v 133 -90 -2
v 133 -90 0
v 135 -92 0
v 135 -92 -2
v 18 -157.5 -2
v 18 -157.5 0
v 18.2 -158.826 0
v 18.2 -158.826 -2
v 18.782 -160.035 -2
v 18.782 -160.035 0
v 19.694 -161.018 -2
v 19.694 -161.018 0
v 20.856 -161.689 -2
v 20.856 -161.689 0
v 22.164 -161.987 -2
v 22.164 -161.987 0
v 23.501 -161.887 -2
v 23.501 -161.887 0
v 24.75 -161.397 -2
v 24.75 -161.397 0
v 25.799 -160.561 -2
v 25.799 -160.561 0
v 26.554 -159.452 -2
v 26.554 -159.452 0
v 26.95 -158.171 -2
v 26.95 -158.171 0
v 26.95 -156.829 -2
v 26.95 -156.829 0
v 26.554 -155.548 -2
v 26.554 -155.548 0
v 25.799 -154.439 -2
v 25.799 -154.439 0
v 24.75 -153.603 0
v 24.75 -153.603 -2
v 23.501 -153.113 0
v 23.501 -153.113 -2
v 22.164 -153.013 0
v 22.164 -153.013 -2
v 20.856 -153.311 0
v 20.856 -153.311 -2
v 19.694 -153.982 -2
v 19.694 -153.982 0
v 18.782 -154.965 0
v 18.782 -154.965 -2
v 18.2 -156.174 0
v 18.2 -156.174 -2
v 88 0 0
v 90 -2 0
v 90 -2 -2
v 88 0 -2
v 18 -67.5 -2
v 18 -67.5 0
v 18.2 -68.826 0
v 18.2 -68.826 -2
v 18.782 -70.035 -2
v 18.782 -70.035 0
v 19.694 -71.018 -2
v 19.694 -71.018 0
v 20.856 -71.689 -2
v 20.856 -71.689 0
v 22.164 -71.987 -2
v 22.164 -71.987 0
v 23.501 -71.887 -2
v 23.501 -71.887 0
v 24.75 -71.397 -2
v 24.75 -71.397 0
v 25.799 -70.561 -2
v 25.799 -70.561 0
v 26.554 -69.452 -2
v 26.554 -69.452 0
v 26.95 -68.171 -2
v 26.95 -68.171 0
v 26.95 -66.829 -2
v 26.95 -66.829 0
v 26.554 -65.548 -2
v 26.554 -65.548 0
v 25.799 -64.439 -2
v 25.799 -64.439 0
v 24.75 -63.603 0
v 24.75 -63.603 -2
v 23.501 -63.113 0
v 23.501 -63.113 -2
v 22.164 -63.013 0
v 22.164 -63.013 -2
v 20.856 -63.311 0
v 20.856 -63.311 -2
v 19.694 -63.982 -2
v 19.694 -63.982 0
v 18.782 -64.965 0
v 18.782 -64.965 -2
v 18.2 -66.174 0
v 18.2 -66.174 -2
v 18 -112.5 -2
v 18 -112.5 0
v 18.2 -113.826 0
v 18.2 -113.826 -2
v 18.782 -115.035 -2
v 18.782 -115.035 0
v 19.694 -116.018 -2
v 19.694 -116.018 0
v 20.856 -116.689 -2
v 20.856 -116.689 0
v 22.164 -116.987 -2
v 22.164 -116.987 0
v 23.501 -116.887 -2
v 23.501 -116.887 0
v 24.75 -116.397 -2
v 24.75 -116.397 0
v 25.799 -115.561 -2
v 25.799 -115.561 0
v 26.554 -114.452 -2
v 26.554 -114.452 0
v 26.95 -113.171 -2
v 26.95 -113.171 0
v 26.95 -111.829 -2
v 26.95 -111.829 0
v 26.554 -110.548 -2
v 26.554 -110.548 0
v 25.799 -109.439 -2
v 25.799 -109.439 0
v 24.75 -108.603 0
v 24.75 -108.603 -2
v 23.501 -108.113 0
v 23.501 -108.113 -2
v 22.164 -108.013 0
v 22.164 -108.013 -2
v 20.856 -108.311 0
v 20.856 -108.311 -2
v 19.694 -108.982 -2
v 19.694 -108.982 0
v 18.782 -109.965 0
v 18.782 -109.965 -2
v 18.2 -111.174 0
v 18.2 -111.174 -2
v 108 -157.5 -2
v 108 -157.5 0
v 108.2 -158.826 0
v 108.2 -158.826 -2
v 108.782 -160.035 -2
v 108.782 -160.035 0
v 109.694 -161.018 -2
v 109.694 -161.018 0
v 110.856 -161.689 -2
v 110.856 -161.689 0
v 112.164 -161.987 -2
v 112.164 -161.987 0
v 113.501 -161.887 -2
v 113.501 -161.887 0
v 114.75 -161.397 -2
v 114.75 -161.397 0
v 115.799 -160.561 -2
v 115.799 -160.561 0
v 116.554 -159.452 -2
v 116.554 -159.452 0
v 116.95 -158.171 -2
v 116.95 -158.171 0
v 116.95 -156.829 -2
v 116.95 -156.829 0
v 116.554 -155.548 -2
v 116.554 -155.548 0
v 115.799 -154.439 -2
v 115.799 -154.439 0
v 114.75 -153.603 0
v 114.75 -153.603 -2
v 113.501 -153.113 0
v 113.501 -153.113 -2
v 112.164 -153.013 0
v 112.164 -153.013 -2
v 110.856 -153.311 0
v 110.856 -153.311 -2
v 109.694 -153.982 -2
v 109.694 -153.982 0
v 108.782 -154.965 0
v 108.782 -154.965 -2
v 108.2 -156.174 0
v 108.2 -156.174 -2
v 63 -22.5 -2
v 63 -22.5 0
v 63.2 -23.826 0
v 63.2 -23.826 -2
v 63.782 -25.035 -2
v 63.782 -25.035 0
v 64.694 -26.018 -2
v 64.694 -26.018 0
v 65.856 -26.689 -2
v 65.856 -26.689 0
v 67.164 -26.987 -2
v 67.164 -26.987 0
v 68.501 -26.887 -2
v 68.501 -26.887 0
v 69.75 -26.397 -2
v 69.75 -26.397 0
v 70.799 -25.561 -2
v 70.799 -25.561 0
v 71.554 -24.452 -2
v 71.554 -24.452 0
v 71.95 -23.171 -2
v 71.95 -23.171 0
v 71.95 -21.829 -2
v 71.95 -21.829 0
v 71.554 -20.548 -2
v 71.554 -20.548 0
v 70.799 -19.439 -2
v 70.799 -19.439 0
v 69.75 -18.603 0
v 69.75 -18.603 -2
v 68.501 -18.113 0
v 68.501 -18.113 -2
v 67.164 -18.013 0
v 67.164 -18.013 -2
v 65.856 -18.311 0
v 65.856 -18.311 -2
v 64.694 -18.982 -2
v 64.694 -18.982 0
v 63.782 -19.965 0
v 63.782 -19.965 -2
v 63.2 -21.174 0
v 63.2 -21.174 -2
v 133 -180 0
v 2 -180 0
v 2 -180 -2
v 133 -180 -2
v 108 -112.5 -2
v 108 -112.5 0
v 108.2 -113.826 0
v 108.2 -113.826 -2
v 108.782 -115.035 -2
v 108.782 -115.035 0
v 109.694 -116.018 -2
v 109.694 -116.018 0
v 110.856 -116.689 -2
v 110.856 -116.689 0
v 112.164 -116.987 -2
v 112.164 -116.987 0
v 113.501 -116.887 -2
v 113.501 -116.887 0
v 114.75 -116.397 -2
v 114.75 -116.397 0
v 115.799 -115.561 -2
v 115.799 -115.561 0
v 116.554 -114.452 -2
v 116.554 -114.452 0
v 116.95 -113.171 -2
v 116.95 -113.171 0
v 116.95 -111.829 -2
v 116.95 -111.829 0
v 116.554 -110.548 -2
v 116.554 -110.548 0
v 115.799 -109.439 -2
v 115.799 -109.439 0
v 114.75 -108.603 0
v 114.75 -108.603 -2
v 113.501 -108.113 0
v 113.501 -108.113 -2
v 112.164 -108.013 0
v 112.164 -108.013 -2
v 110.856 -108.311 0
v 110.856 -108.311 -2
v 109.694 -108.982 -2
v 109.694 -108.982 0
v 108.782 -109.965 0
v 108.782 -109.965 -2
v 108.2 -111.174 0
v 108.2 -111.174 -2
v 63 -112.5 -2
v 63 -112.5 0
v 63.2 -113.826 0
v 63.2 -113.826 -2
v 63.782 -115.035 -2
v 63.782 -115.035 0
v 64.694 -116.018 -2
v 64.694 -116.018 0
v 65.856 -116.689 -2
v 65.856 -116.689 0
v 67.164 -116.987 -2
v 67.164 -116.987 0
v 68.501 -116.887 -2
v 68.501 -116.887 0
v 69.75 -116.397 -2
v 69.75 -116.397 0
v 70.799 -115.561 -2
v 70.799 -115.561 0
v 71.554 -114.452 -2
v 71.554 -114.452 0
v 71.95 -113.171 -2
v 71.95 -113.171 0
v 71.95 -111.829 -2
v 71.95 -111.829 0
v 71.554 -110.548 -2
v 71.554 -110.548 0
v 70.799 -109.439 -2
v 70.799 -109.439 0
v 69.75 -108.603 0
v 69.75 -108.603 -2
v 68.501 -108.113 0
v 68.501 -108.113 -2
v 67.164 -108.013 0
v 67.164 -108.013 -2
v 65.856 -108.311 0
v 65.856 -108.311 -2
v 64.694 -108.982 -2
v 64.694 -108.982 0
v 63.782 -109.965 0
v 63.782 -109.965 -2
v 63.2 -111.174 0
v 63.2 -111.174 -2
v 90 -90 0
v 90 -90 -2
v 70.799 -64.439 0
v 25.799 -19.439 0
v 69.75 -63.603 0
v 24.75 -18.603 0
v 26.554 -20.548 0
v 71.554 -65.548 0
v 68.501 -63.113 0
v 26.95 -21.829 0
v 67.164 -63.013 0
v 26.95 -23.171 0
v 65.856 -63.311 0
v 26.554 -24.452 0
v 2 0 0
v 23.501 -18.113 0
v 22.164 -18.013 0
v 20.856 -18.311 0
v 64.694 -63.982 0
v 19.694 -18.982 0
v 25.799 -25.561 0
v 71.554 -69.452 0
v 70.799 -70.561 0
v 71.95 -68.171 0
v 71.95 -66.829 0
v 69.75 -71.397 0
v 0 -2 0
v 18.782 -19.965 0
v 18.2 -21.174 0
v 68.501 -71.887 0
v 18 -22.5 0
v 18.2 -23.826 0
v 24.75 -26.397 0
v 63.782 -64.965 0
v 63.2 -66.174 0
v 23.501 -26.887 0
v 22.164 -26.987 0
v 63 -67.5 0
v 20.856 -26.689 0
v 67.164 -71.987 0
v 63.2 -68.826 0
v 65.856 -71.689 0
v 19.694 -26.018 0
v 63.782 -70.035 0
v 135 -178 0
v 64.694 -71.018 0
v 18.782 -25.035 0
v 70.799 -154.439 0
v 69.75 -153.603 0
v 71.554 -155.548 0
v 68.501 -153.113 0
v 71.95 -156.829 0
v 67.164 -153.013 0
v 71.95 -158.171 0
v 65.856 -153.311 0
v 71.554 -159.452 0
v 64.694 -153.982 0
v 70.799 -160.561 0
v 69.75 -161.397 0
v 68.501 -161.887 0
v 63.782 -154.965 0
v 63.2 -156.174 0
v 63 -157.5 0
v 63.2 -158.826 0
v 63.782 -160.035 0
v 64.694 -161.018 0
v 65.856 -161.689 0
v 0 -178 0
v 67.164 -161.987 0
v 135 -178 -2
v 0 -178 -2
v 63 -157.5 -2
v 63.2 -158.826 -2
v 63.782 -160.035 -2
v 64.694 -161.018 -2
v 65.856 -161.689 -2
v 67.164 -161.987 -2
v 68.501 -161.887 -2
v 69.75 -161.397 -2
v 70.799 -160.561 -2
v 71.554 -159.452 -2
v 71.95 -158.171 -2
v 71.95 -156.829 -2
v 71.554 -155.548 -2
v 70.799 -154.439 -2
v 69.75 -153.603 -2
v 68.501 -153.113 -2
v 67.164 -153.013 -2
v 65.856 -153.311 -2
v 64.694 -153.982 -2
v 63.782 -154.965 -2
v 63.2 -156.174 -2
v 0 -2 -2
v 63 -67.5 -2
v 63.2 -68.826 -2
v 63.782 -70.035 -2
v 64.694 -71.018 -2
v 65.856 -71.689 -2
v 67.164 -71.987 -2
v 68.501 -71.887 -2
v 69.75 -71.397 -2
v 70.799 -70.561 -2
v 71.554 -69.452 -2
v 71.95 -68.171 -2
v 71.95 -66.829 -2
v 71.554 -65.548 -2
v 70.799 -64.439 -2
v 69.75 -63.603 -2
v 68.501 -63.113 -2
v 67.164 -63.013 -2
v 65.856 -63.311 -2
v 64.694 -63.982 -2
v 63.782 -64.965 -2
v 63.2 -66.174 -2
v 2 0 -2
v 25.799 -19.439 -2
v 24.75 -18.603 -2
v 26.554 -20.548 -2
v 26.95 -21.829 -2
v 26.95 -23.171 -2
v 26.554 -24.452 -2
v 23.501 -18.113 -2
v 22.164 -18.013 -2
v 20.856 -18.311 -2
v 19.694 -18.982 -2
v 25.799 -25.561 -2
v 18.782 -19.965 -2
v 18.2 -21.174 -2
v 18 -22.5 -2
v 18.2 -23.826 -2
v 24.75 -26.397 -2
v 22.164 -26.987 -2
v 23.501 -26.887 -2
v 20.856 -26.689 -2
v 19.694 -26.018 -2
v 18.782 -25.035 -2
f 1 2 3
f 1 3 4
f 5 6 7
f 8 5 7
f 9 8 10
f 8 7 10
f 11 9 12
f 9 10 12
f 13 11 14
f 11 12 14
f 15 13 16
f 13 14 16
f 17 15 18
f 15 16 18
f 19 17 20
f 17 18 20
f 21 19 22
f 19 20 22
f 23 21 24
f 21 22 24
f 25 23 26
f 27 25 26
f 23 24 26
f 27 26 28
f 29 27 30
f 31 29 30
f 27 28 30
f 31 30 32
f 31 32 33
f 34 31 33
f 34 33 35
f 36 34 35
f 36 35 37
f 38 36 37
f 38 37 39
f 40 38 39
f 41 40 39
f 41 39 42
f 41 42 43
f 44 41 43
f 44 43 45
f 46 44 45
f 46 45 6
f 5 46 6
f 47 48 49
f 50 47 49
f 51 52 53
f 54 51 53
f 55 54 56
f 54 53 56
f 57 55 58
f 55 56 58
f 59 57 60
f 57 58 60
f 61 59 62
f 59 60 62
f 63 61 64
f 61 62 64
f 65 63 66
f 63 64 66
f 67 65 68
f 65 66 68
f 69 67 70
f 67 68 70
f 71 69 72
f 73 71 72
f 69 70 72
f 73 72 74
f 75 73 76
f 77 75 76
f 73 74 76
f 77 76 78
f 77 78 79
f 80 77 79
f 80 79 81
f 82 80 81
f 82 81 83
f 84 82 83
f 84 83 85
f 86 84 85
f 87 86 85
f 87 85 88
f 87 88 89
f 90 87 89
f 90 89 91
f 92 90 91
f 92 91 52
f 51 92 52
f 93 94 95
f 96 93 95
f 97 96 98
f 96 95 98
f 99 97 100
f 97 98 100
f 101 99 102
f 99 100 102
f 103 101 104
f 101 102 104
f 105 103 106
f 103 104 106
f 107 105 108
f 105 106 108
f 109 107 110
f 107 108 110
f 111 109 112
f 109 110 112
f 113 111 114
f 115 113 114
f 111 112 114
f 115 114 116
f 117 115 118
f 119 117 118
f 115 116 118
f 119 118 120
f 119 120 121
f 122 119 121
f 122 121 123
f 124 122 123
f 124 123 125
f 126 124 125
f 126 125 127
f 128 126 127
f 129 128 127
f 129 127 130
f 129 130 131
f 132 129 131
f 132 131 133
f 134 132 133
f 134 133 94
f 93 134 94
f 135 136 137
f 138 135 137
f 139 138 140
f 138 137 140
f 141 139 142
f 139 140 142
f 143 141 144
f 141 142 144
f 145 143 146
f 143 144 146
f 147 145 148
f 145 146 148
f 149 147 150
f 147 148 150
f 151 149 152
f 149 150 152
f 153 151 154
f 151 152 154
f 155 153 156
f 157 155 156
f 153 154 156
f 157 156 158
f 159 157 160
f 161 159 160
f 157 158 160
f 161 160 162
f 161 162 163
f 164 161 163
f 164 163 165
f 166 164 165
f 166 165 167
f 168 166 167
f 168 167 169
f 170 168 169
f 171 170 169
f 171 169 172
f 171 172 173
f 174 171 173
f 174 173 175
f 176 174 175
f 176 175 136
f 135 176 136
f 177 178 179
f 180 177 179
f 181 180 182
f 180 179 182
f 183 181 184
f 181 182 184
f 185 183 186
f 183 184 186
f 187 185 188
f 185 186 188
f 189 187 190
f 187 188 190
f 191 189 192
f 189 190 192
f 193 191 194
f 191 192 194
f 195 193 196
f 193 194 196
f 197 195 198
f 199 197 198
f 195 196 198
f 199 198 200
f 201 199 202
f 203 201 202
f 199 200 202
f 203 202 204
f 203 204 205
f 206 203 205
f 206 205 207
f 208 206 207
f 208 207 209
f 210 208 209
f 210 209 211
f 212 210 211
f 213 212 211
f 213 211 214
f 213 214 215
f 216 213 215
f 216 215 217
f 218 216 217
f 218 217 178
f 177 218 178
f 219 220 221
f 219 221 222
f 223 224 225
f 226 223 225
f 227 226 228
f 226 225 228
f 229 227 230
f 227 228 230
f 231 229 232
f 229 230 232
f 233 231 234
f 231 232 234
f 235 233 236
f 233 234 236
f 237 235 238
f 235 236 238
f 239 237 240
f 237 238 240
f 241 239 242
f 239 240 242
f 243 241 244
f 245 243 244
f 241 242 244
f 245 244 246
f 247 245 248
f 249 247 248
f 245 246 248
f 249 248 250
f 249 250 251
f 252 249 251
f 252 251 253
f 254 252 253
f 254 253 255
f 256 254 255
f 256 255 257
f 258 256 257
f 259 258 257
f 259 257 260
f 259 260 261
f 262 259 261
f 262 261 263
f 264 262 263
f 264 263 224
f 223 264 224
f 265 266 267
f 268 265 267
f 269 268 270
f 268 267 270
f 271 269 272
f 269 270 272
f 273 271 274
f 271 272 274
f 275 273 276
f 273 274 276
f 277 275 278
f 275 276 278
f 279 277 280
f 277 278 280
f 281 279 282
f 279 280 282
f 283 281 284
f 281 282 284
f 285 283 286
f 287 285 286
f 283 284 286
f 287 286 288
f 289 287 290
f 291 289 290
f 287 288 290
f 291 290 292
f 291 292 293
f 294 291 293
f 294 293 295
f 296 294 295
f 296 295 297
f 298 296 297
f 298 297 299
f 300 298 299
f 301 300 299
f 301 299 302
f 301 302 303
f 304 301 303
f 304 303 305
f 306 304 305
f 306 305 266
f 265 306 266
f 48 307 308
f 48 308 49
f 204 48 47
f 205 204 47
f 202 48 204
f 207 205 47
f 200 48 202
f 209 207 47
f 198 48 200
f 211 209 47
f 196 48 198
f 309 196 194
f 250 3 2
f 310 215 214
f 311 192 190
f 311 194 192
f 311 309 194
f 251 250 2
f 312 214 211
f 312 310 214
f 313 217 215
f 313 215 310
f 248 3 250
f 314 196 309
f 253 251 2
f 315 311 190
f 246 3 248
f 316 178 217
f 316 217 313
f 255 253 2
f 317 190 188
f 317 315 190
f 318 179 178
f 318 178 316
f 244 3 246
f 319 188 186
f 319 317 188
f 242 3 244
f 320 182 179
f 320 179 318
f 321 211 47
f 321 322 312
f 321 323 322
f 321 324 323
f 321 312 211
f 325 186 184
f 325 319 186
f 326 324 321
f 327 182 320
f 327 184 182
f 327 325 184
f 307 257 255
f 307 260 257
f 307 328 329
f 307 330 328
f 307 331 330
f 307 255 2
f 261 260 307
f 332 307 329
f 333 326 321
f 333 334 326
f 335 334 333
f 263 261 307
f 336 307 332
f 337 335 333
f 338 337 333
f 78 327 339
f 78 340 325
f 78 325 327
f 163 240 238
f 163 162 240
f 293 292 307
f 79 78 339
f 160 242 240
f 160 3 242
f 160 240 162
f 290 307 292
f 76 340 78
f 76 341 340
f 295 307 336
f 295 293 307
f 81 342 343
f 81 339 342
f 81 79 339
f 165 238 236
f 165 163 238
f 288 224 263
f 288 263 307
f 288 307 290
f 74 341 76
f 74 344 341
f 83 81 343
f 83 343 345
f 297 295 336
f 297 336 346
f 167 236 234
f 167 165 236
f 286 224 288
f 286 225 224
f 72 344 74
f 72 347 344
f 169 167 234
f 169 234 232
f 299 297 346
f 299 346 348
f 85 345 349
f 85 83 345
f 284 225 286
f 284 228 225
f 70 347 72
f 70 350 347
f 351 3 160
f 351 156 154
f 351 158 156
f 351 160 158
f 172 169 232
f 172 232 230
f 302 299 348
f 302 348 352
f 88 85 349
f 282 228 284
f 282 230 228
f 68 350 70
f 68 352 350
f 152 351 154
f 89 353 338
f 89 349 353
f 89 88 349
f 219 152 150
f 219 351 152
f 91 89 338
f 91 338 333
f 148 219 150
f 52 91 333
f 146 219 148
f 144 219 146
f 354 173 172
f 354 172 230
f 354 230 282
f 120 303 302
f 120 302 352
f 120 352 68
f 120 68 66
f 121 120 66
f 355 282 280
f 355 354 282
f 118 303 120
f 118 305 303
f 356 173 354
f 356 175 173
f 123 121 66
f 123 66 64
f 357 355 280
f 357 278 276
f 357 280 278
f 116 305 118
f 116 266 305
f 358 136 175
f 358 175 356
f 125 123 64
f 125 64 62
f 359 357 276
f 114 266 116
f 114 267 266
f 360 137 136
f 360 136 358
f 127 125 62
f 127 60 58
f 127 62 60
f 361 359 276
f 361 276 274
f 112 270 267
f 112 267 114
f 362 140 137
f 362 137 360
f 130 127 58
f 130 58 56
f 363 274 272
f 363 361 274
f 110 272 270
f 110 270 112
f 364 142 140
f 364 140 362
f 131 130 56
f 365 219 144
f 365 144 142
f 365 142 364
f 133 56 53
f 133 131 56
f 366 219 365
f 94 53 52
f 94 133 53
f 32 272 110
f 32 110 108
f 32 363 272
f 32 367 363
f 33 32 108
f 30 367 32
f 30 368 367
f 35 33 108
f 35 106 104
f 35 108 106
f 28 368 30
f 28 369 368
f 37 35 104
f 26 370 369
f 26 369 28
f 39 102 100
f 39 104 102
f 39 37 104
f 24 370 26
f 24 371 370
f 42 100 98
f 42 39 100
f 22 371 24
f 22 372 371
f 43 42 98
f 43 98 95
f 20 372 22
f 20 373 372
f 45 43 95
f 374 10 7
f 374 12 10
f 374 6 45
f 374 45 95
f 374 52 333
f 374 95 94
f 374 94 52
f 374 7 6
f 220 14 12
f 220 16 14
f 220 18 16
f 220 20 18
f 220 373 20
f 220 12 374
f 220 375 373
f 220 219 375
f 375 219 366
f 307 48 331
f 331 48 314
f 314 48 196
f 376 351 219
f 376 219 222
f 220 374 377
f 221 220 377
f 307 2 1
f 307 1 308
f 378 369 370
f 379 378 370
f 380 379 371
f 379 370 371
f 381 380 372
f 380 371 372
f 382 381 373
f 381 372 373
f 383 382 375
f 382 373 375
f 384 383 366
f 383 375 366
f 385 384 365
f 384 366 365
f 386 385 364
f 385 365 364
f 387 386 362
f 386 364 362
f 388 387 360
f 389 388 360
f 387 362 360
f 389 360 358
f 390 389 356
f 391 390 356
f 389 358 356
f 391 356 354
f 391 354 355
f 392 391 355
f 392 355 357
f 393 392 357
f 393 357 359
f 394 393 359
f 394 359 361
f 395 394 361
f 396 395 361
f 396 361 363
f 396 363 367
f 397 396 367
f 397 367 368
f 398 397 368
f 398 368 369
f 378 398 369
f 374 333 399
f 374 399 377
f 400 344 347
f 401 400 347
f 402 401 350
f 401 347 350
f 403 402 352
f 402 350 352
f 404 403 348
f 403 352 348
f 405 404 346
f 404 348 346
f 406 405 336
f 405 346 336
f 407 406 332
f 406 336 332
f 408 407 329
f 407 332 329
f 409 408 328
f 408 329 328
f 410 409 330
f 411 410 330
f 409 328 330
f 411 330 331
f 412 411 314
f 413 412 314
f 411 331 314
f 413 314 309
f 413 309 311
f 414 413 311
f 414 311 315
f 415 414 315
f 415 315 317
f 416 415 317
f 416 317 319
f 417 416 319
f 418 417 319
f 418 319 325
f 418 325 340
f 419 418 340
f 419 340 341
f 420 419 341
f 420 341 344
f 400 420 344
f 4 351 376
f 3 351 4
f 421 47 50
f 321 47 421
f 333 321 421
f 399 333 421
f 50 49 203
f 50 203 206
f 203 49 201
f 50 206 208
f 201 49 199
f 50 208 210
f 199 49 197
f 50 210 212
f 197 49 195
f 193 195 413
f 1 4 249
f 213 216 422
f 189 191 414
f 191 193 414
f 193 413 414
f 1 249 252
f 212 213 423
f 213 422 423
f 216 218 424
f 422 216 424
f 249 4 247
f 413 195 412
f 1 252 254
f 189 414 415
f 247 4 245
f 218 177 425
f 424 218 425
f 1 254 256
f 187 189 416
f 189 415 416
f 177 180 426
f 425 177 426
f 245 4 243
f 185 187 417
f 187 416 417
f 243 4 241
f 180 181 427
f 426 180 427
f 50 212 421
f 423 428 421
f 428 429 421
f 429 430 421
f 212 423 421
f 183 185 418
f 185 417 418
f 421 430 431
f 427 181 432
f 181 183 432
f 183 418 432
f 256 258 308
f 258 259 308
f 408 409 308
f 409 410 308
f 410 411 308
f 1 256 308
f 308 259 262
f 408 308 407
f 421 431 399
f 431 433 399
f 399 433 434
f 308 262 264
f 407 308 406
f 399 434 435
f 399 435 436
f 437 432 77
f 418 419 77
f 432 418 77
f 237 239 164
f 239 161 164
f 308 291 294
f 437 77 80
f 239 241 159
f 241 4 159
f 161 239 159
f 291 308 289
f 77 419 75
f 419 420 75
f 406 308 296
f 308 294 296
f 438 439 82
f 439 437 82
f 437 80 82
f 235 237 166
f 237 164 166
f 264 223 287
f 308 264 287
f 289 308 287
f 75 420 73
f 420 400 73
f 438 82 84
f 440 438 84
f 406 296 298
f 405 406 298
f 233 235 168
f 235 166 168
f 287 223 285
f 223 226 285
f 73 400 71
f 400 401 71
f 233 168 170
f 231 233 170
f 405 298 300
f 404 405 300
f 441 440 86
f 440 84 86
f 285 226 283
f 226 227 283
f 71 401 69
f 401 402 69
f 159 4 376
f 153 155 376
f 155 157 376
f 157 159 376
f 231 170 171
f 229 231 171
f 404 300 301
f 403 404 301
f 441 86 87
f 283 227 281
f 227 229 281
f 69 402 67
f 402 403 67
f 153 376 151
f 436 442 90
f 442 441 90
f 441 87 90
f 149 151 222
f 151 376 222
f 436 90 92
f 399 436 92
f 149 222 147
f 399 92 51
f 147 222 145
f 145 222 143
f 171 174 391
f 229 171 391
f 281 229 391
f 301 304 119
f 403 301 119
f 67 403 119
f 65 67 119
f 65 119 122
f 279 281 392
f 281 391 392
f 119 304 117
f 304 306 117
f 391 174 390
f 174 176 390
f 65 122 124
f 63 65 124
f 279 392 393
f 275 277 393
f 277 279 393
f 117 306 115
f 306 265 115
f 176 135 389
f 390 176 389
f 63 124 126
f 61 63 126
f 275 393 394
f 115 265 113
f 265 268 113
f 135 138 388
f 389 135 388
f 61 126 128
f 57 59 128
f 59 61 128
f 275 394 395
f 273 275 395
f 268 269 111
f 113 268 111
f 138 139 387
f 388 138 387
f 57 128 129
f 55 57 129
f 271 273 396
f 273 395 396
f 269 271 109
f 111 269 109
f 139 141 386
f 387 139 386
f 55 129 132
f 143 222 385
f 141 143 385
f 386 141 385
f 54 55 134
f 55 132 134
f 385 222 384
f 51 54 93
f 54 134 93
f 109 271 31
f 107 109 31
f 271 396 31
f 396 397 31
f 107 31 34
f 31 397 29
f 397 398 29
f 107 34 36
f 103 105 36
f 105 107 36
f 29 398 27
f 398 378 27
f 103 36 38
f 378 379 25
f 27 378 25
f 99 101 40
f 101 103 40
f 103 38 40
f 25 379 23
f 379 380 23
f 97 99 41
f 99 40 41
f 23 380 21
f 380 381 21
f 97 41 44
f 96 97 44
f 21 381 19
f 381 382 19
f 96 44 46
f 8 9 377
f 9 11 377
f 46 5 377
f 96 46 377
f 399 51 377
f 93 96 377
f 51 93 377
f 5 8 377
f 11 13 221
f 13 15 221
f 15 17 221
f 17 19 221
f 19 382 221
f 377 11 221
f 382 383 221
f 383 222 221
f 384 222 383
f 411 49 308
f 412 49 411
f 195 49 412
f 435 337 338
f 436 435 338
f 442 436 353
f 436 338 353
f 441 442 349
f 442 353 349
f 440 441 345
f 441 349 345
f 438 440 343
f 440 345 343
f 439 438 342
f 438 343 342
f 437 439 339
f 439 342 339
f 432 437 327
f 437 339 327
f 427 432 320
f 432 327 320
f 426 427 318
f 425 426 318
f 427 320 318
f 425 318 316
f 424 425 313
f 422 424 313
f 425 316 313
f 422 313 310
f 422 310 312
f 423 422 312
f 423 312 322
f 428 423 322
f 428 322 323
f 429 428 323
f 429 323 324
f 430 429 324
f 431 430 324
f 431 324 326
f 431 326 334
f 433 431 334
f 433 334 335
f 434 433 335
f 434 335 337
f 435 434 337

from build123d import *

# Parameters (mm, degrees)
EXTRUDE_1_DEPTH   = 2
HOLE_WIZARD_M81_D = 9
CHAMFER_1_SIZE    = 2


with BuildPart() as part:
    # Эскиз1 → Бобышка-Вытянуть1 (new body)
    with BuildSketch(Plane(origin=(0, 0, 0), x_dir=(1, 0, 0), z_dir=(0, 0, -1))):
        Polygon((0, 0), (0, 180), (135, 180), (135, 90), (90, 90), (90, 0), align=None)
    extrude(amount=EXTRUDE_1_DEPTH)

    # Отверстие с зазором M81 (through all)
    with Locations(Plane(origin=(0, 0, -2), x_dir=(1, 0, 0), z_dir=(0, 0, -1))):
        with Locations((22.5, 157.5), (22.5, 112.5), (22.5, 67.5), (22.5, 22.5), (67.5, 157.5), (67.5, 112.5), (67.5, 67.5), (67.5, 22.5), (112.5, 157.5), (112.5, 112.5)):
            Hole(HOLE_WIZARD_M81_D / 2)

    # Фаска1
    chamfer_1_edges = [part.edges().sort_by_distance(p)[0] for p in [
        (0, 0, -1),
        (0, -180, -1),
        (135, -180, -1),
        (135, -90, -1),
        (90, 0, -1),
    ]]
    chamfer(chamfer_1_edges, length=CHAMFER_1_SIZE)


solid = part.part
